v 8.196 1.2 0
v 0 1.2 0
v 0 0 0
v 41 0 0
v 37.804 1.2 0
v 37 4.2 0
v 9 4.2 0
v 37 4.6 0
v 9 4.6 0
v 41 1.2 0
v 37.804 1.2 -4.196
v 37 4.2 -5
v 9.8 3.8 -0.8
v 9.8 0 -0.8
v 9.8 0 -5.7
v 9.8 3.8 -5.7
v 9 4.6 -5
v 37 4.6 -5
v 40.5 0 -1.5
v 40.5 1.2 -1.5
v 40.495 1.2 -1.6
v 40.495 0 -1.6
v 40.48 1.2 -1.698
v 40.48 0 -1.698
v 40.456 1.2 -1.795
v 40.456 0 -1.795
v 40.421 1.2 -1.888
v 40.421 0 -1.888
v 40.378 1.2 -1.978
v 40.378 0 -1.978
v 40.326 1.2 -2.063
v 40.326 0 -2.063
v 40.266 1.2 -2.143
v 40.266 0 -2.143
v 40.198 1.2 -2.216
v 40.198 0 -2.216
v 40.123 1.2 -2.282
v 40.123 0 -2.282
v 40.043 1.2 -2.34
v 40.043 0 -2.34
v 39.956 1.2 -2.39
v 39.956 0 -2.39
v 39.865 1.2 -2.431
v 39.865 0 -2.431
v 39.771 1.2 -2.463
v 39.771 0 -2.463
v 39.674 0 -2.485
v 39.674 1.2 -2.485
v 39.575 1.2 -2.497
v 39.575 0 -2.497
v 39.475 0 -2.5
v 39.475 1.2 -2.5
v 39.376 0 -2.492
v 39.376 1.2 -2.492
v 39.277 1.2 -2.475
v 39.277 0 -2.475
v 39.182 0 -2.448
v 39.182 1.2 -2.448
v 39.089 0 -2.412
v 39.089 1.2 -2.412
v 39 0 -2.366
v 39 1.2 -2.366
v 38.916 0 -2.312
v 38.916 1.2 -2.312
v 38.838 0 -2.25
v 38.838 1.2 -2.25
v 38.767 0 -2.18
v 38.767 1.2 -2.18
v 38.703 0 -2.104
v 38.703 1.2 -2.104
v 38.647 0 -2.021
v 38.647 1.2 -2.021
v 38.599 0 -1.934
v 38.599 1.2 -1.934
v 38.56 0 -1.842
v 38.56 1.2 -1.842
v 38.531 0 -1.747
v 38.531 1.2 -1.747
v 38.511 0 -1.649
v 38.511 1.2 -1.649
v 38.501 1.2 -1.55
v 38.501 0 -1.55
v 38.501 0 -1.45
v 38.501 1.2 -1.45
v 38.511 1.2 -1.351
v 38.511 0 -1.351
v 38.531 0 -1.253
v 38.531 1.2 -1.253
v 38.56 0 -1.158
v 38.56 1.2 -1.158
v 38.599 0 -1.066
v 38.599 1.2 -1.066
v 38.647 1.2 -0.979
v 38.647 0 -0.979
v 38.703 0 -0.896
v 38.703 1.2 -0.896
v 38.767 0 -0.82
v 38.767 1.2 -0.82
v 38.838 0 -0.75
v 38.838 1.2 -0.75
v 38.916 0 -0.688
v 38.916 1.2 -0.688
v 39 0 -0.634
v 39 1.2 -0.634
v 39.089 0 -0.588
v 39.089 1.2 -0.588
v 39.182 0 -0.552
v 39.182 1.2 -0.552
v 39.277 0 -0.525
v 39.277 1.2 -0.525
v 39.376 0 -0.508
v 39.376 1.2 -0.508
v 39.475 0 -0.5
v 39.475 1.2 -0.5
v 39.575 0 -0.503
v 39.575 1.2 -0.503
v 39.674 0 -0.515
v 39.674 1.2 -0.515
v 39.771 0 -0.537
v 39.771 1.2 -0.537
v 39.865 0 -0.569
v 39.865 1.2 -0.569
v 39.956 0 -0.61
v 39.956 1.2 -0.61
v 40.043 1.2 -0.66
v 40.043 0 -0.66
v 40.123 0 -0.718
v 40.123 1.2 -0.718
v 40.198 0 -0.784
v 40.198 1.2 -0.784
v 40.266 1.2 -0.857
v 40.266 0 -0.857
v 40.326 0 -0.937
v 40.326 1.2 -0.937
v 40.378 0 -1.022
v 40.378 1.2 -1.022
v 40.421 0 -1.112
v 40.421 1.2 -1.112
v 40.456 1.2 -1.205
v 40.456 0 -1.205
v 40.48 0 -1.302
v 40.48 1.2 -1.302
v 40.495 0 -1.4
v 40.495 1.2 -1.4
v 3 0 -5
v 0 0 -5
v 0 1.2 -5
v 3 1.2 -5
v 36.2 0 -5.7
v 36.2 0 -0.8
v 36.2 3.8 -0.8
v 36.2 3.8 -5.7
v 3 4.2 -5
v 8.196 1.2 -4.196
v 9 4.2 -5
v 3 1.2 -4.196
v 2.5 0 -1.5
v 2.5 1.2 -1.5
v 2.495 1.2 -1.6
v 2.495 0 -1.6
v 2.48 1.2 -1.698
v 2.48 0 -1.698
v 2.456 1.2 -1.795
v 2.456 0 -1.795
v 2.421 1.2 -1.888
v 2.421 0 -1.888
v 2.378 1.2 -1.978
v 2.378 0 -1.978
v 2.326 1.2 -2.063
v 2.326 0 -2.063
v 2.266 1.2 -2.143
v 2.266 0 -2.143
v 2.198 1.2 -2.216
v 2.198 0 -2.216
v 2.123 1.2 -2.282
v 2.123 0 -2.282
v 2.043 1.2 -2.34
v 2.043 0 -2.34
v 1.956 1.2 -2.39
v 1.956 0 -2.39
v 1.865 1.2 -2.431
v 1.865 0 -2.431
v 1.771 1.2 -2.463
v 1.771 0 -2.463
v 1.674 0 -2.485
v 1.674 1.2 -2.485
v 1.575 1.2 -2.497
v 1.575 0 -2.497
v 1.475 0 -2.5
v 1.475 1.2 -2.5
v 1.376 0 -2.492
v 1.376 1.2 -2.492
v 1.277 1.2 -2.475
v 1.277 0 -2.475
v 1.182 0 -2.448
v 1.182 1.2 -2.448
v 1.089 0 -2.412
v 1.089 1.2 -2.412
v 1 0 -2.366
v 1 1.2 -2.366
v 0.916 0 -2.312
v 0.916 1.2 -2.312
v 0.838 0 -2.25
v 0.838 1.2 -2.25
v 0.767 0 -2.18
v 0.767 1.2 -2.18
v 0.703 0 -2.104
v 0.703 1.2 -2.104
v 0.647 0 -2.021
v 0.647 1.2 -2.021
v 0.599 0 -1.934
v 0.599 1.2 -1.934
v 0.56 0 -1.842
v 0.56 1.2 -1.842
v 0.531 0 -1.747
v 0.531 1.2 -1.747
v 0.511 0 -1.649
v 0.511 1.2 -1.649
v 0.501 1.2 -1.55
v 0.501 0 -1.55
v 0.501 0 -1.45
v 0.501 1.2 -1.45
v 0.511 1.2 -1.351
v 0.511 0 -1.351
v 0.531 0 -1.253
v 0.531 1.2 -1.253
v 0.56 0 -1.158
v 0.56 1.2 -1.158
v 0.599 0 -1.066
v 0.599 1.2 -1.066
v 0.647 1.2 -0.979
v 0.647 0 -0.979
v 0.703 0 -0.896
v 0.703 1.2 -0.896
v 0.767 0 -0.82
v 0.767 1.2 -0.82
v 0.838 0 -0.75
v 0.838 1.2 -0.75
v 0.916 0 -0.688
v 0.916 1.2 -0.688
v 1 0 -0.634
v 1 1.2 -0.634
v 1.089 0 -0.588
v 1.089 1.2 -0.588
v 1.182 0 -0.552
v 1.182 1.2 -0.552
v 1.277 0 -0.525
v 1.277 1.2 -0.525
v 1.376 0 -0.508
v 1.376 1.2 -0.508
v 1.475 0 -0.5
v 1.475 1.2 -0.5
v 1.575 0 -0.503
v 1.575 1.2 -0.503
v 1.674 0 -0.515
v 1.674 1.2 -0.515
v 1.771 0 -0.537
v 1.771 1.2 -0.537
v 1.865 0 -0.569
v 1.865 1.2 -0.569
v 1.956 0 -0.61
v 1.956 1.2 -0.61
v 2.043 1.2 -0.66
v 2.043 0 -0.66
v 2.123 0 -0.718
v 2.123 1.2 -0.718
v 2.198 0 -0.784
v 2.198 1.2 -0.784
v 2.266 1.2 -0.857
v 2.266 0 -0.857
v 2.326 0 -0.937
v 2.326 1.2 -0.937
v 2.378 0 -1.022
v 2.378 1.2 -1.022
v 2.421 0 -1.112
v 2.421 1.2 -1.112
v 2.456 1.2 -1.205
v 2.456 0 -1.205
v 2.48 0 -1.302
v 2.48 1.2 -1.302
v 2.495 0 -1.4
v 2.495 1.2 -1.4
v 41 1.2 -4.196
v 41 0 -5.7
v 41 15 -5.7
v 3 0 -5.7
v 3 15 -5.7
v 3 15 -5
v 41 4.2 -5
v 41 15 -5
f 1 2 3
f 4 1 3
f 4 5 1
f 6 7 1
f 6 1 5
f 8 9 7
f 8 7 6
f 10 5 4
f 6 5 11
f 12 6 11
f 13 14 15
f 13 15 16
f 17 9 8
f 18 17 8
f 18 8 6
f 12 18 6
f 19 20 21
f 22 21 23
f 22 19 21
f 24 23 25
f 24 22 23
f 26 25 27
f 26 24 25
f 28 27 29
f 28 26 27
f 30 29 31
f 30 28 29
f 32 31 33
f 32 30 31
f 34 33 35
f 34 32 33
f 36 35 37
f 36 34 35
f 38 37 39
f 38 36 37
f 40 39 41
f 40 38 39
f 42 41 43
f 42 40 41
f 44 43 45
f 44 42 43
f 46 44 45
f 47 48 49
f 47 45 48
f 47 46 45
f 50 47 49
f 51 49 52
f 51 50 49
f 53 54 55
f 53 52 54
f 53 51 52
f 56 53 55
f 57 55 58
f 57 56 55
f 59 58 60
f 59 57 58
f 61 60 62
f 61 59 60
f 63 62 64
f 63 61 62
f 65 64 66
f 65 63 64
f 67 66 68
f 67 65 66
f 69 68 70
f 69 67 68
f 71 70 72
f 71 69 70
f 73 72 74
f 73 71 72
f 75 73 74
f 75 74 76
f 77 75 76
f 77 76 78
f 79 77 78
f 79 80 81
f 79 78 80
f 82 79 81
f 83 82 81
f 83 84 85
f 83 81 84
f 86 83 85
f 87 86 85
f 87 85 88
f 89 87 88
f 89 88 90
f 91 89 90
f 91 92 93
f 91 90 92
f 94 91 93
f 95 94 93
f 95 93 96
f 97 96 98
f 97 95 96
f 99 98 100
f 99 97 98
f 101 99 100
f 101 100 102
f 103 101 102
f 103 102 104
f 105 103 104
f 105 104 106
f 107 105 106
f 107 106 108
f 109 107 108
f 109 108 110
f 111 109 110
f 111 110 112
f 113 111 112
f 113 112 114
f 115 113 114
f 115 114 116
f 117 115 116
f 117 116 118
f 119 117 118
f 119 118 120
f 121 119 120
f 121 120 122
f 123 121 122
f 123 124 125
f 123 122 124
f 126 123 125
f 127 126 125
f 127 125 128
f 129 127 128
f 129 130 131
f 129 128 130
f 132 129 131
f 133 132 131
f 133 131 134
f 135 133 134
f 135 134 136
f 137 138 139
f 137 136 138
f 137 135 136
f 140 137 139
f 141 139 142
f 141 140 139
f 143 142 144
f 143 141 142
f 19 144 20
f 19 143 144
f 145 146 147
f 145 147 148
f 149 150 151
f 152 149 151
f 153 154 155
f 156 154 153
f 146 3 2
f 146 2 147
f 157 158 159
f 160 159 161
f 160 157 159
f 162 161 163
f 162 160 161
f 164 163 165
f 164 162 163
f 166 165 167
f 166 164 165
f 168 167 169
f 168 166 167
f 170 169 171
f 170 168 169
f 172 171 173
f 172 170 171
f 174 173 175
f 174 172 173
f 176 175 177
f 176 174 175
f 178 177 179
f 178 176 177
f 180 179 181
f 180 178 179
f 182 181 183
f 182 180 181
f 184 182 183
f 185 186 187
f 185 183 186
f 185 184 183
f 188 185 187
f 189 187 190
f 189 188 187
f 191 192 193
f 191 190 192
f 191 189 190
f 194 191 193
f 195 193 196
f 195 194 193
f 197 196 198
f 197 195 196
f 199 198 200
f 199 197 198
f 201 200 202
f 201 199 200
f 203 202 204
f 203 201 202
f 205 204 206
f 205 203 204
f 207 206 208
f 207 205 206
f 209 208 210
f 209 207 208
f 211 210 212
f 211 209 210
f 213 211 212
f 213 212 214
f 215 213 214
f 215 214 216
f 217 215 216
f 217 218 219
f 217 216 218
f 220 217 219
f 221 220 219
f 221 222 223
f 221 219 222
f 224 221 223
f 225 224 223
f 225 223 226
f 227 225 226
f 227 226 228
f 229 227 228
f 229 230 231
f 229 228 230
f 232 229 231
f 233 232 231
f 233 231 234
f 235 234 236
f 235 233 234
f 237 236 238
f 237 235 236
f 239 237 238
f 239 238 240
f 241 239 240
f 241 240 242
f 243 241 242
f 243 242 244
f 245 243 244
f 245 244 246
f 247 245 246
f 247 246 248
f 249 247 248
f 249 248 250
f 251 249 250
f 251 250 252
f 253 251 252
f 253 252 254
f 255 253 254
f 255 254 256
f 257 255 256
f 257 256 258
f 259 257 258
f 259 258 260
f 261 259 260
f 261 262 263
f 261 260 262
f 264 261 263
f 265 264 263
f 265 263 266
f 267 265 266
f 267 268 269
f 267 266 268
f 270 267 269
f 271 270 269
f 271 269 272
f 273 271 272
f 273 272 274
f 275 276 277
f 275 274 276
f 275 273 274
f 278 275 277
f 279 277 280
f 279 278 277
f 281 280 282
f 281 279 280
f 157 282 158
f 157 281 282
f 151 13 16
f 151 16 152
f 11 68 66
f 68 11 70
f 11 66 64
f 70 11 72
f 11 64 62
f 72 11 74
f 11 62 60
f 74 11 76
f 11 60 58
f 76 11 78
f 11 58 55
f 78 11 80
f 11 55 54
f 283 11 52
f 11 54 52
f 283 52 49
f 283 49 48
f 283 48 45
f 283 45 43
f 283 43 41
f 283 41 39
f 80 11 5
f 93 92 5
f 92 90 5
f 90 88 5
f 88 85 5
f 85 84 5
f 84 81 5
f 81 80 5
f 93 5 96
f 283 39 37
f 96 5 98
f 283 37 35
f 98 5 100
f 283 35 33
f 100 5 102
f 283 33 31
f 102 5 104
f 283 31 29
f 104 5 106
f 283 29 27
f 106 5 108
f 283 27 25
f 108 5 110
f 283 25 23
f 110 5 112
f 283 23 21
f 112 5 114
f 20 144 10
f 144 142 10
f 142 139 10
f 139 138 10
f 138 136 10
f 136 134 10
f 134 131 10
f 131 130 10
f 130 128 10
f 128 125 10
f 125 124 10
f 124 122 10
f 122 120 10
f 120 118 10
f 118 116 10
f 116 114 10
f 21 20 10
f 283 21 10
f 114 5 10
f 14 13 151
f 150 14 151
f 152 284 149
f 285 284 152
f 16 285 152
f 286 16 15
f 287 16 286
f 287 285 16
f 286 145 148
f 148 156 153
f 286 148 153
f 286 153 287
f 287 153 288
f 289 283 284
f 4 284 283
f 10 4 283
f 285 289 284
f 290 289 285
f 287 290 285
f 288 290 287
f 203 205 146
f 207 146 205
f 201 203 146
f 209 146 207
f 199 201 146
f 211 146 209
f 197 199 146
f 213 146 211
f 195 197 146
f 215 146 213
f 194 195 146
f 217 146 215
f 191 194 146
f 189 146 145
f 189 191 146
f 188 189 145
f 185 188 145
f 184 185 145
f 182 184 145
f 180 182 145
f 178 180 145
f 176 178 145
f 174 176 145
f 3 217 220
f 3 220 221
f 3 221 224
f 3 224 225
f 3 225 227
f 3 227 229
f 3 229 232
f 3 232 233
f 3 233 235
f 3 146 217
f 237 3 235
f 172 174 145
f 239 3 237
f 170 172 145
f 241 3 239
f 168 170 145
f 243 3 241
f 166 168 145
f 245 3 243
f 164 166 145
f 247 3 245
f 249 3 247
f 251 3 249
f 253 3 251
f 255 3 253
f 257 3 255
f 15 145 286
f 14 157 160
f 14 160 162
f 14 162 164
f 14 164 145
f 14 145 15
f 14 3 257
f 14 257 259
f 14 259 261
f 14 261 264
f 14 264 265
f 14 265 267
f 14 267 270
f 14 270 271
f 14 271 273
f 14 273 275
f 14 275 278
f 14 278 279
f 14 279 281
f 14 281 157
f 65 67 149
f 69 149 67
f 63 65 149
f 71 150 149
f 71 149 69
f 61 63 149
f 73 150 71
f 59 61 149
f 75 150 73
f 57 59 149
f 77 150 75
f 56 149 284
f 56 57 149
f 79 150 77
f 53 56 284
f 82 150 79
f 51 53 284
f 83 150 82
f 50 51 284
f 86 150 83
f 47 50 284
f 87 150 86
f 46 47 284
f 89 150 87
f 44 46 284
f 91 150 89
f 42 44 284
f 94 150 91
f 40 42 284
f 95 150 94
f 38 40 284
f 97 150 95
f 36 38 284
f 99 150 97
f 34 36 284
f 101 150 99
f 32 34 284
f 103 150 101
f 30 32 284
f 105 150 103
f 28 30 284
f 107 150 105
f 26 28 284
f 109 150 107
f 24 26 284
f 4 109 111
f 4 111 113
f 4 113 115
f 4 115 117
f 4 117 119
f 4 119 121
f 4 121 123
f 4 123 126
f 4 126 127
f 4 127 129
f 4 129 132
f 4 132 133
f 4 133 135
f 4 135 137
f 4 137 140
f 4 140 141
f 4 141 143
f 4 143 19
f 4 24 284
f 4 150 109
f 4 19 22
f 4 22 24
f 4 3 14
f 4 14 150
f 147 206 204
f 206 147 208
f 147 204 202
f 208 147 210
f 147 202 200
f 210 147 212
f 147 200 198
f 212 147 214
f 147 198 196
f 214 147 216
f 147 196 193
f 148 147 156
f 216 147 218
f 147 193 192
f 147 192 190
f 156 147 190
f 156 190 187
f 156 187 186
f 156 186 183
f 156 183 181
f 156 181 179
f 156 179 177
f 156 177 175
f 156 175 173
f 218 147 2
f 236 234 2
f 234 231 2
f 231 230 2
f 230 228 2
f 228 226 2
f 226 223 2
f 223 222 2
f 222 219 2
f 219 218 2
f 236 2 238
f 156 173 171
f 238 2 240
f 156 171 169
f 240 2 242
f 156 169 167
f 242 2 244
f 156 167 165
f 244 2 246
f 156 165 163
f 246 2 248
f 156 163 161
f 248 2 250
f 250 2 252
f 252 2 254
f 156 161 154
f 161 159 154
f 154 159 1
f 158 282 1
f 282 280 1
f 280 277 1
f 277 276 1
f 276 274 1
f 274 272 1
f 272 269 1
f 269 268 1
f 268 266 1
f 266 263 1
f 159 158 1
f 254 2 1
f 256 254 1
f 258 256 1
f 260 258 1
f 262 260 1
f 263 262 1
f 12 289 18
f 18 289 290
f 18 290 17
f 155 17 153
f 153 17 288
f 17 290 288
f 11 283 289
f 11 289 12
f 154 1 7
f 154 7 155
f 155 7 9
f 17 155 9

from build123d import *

# Parameters (mm, degrees)
SKETCH1_W             = 41
SKETCH1_H             = 5
SKETCH1_R             = 1
BOSS_EXTRUDE1_DEPTH   = 10
CUT_EXTRUDE1_DEPTH    = 10
SKETCH4_W             = 38
SKETCH4_H             = 15
BOSS_EXTRUDE2_DEPTH   = 0.7
SKETCH3_W             = 26.4
SKETCH3_H             = 3.8
CUT_EXTRUDE2_DEPTH    = 10
CHAMFER1_SIZE         = 3
CHAMFER1_SIZE2        = 0.803847577
CHAMFER1_PART_2_SIZE  = 3
CHAMFER1_PART_2_SIZE2 = 0.803847577
CHAMFER1_PART_3_SIZE  = 3
CHAMFER1_PART_3_SIZE2 = 0.803847577
SKETCH7_W             = 26.4
SKETCH7_H             = 3.8
BOSS_EXTRUDE3_DEPTH   = 0.8


with BuildPart() as part:
    # Sketch1 → Boss-Extrude1 (new body)
    with BuildSketch(Plane(origin=(0, 0, 0), x_dir=(1, 0, 0), z_dir=(0, 1, 0))):
        with Locations((20.5, 2.5)):
            Rectangle(SKETCH1_W, SKETCH1_H)
        with Locations((1.5, 1.5)):
            Circle(SKETCH1_R, mode=Mode.SUBTRACT)
        with Locations((39.5, 1.5)):
            Circle(SKETCH1_R, mode=Mode.SUBTRACT)
    extrude(amount=BOSS_EXTRUDE1_DEPTH)

    # Sketch2 → Cut-Extrude1 (cut)
    with BuildSketch(Plane.XY):
        Polygon((0, 10), (0, 1.2), (9, 1.2), (9, 4.6), (37, 4.6), (37, 1.2), (41, 1.2), (41, 10), align=None)
    extrude(amount=-CUT_EXTRUDE1_DEPTH, mode=Mode.SUBTRACT)

    # Sketch4 → Boss-Extrude2 (add)
    with BuildSketch(Plane(origin=(0, 0, -5), x_dir=(-1, 0, 0), z_dir=(0, 0, -1))):
        with Locations((-22, 7.5)):
            Rectangle(SKETCH4_W, SKETCH4_H)
    extrude(amount=BOSS_EXTRUDE2_DEPTH)

    # Sketch3 → Cut-Extrude2 (cut)
    with BuildSketch(Plane.XY):
        with Locations((23, 1.9)):
            Rectangle(SKETCH3_W, SKETCH3_H)
    extrude(amount=-CUT_EXTRUDE2_DEPTH, mode=Mode.SUBTRACT)

    # Chamfer1
    chamfer1_edges = [part.edges().sort_by_distance(p)[0] for p in [
        (37, 1.2, -2.5),
    ]]
    chamfer1_side = [part.faces().sort_by_distance(p)[0] for p in [
        (37, 2.9, -2.5),
    ]]
    chamfer(chamfer1_edges, length=CHAMFER1_SIZE, length2=CHAMFER1_SIZE2, reference=chamfer1_side[0])

    # Chamfer1 part 2
    chamfer1_part_2_edges = [part.edges().sort_by_distance(p)[0] for p in [
        (9, 1.2, -2.5),
    ]]
    chamfer1_part_2_side = [part.faces().sort_by_distance(p)[0] for p in [
        (9, 2.9, -2.5),
    ]]
    chamfer(chamfer1_part_2_edges, length=CHAMFER1_PART_2_SIZE, length2=CHAMFER1_PART_2_SIZE2, reference=chamfer1_part_2_side[0])

    # Chamfer1 part 3
    chamfer1_part_3_edges = [part.edges().sort_by_distance(p)[0] for p in [
        (39, 1.2, -5),
        (6, 1.2, -5),
    ]]
    chamfer1_part_3_side = [part.faces().sort_by_distance(p)[0] for p in [
        (21.778191985, 9.253401678, -5),
    ]]
    chamfer(chamfer1_part_3_edges, length=CHAMFER1_PART_3_SIZE, length2=CHAMFER1_PART_3_SIZE2, reference=chamfer1_part_3_side[0])

    # Sketch7 → Boss-Extrude3 (add)
    with BuildSketch(Plane.XY):
        with Locations((23, 1.9)):
            Rectangle(SKETCH7_W, SKETCH7_H)
    extrude(amount=-BOSS_EXTRUDE3_DEPTH)


solid = part.part
